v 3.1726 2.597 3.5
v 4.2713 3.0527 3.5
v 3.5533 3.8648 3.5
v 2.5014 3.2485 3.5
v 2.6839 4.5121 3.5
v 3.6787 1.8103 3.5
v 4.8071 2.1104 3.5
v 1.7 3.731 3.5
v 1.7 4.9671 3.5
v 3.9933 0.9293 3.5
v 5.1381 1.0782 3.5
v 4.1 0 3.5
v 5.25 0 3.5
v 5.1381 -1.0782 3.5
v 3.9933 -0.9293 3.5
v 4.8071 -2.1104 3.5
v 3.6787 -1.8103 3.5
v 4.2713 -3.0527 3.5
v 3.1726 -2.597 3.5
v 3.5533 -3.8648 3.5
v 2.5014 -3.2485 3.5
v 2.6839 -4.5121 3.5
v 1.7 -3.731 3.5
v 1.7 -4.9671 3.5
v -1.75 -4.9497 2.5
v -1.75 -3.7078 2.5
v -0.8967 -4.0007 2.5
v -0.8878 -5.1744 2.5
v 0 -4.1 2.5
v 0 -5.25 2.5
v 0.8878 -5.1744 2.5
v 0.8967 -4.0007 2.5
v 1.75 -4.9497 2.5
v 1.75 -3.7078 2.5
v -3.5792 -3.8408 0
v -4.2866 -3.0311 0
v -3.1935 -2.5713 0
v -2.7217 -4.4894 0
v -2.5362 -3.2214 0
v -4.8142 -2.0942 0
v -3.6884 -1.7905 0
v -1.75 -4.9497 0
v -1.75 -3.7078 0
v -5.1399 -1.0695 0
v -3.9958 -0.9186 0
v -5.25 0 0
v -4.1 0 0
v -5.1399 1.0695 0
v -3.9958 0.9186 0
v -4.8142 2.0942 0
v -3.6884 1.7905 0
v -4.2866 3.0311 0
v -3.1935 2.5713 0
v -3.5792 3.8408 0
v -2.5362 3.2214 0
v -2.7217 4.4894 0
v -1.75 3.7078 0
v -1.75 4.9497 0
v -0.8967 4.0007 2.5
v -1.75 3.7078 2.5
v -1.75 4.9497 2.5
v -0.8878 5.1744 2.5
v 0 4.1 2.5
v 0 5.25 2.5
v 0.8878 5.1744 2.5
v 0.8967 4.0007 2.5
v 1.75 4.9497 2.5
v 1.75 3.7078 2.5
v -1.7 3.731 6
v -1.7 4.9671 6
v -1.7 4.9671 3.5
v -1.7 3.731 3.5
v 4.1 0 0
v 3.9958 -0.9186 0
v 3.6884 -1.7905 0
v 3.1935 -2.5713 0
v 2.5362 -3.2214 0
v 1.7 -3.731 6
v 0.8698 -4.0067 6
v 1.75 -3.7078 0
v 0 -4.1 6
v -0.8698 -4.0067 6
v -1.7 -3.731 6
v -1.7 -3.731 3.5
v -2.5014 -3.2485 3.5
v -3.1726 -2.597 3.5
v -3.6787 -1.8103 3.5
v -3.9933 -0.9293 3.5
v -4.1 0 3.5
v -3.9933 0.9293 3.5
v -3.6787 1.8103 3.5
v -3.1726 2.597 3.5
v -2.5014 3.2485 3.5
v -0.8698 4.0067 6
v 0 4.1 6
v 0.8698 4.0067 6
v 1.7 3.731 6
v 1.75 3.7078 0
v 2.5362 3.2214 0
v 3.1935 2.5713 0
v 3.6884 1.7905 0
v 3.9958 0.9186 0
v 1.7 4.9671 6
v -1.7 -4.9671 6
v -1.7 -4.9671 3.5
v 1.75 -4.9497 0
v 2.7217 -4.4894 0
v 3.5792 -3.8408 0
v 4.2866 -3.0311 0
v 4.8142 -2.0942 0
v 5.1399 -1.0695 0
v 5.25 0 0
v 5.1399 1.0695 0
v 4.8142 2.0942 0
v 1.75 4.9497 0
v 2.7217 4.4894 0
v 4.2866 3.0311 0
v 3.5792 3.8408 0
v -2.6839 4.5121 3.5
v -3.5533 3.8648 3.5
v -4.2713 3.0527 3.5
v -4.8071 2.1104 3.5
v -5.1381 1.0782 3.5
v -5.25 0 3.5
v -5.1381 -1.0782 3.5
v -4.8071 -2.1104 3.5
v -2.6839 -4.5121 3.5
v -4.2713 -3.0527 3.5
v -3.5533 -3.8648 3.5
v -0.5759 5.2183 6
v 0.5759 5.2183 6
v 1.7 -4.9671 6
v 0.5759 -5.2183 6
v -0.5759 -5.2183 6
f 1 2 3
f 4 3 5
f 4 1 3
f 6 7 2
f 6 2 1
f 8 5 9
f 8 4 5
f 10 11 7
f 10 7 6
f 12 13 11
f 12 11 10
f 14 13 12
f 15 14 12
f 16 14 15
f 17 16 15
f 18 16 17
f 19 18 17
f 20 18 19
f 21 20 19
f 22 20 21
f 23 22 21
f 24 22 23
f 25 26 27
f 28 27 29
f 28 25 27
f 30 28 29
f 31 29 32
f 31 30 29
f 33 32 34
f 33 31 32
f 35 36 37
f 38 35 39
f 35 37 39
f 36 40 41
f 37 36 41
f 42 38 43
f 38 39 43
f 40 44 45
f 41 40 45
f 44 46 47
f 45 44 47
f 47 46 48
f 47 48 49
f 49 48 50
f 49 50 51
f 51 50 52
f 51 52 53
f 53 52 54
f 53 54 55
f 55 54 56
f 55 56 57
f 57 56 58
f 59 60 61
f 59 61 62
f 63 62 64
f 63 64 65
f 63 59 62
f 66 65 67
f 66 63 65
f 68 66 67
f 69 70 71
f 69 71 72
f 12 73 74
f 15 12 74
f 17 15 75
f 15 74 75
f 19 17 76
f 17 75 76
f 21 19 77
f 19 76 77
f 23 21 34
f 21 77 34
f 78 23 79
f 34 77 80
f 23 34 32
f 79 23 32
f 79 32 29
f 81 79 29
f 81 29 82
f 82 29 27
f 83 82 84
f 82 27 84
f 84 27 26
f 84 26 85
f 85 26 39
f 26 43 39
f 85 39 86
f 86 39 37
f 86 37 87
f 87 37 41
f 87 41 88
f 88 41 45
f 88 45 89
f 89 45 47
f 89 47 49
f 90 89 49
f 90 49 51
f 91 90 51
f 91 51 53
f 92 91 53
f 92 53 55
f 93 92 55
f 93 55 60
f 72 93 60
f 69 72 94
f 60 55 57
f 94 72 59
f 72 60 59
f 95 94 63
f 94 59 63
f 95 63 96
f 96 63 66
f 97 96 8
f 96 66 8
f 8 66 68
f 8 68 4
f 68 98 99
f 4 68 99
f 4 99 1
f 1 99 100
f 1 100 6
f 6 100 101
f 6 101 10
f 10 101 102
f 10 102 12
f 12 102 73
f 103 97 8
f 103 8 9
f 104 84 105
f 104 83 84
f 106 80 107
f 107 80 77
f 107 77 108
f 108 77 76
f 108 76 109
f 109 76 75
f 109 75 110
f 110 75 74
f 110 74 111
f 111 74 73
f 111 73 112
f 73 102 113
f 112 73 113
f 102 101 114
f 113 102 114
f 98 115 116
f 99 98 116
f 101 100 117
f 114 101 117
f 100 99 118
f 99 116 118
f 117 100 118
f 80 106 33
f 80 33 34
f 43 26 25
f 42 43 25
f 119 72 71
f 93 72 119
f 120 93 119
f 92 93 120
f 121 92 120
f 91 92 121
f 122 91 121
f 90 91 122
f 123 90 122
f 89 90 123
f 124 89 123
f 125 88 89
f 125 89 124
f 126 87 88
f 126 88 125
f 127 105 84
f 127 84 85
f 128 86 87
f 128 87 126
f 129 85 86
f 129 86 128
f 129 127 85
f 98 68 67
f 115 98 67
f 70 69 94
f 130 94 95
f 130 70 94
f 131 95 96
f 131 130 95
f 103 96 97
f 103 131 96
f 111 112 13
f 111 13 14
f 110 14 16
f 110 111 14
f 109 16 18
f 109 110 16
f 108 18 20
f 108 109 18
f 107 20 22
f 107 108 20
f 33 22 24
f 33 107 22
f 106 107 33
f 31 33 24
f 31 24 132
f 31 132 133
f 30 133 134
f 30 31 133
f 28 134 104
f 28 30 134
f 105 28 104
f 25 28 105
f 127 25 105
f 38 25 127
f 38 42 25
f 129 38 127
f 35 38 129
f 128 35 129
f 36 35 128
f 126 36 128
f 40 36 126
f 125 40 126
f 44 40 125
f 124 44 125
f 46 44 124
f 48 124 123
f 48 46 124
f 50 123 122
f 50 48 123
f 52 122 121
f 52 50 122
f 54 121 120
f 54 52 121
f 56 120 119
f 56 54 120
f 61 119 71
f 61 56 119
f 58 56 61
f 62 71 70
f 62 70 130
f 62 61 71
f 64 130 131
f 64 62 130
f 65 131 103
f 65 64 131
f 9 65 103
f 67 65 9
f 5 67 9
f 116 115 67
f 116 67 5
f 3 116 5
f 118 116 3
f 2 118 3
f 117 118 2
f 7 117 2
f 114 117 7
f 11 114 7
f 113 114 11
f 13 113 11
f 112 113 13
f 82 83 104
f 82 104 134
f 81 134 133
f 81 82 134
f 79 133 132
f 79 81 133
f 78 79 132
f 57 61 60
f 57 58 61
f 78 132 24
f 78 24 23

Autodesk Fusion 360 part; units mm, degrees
sketch "Sketch1" plane through (0, 0, 0) normal (0, 0, 1) x (1, 0, 0)
  circle A0 centre (0, 0) radius 5.25
  circle A1 centre (0, 0) radius 4.1
  dimension "d1" = 10.5
  dimension "d2" = 8.2
extrude "Extrude1" add sketch "Sketch1" along normal blind 6
sketch "Sketch2" plane through (0, 0, 0) normal (0, 0, -1) x (1, 0, 0)
  circle A0 centre (0, 0) radius 4.1
  circle A1 centre (0, 0) radius 5.25
  line L0 (-1.75, 6.7486) -> (1.75, 6.7486)
  line L1 (1.75, 6.7486) -> (1.75, -6.7486)
  line L2 (1.75, -6.7486) -> (-1.75, -6.7486)
  line L3 (-1.75, -6.7486) -> (-1.75, 6.7486)
  line L4 (-1.75, 6.7486) -> (1.75, -6.7486) construction
  line L5 (1.75, 6.7486) -> (-1.75, -6.7486) construction
  dimension "d5" = 3.5
extrude "Extrude2" cut sketch "Sketch2" against normal blind 2.5 contours A0 A1 L1 L3 | A0 A1 L1 L3
sketch "Sketch3" plane through (0, 0, 6) normal (0, 0, 1) x (-1, 0, 0)
  circle A0 centre (0, 0) radius 4.1
  circle A1 centre (0, 0) radius 5.25
  line L0 (-1.7, -5.9064) -> (1.7, -5.9064)
  line L1 (1.7, -5.9064) -> (1.7, 5.9064)
  line L2 (1.7, 5.9064) -> (-1.7, 5.9064)
  line L3 (-1.7, 5.9064) -> (-1.7, -5.9064)
  line L4 (-1.7, -5.9064) -> (1.7, 5.9064) construction
  line L5 (1.7, -5.9064) -> (-1.7, 5.9064) construction
  dimension "d8" = 3.4
extrude "Extrude3" cut sketch "Sketch3" against normal blind 2.5 contours A0 A1 L1 | A0 A1 L3
